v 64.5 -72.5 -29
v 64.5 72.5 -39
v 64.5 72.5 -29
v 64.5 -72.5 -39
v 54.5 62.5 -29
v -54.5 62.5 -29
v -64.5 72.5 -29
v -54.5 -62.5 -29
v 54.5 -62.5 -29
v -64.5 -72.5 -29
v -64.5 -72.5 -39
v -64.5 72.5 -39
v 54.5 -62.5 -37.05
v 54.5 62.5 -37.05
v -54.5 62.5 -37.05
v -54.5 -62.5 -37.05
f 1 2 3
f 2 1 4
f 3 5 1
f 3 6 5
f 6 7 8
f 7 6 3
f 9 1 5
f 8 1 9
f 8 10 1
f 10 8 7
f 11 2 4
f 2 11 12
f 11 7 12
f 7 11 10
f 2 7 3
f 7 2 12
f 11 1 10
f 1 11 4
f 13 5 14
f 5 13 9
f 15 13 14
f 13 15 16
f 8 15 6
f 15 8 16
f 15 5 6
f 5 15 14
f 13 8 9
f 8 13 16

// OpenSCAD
// file: Settings.scad
// Mesurements Of Platform Actual & Global Settings
// Mesurements ACTUAL
PlateWidth = 228;
PlateDepth = 145;
PlateHeight = 5;

ArmWidth = 20;
ArmHeight = 24;
ArmForwardProjection = 25;
ArmRearProjection = 50;
ArmVOffset = 15;

BaseWidth = 129;
BaseHeight = 5;
BaseForwardProjection = 10;
BaseRearProjection = 10;
BaseVOffset = 20;

BaseDeflectorLength = 20;
BaseDeflectorAngle = 45;

ScrewsWidthOutset = 35;
ScrewsDepthOutset = 35;
ScrewsHeadRadius = 10;
ScrewsHeadHeight = 2;
ScrewsHeadProtrusion = 5;
ScrewsShaftRadius = 2;
ScrewsHeadCutoutRadius = 2;

RearPlugWidth = 10;
RearPlugHeight = 5;
RearPlugVOffset = 1;

// Options
// ****************************************************************************************************

d = 0.05;   //Delta

ClipSticksize = 8;
PlateThickness = 5;

TensionerBearingRadius = 2;
TensionerOffsetRadius = 15;
TensionerAngle = 45;
TensionerBearingExtention = 3;
TensionerInset = 2;

//lips to keep the belt in
Lip = 3;
//TopLip = 500;
BottomLip = 5;

MidPlateOverlap = 20;
MidPlateOverlapHeight = 10;
MidPlateOverlapOffset = 7;
ClipHoleSize = 5;

LowerPlateCrossover =10;

RollerCore = 2;
RollerClearance = 2;
RollerLength = PlateDepth - 2*RollerClearance;

UpperRollerProjection  = 40;
UpperRollerRadius = 8;

LowerRollerProjection = 20;
LowerRollerRadius = 6;

RollerBearingCutoutRadius = 3;

IbeamProjection = 15;
IbeamPlateThikness = 6;


// Calculated
// ************************************************************************************************************
PlateX = BaseWidth/2;

RollerLength = PlateDepth - 2*RollerClearance;
PlateArmOverhang = PlateWidth/2 - BaseWidth/2  - ArmWidth; 

UpperRollerPlateX = ArmWidth+PlateArmOverhang+UpperRollerProjection-UpperRollerRadius;
UpperRollerPlateY = -UpperRollerRadius; 

LowerRollerPlateX = ArmWidth+PlateArmOverhang+LowerRollerProjection-LowerRollerRadius;
LowerRollerPlateY = -(ArmVOffset+ArmHeight)+LowerRollerRadius;
// main file
// Roller Project undercarrage

include <Settings.scad>;

Undercarriage();

module Undercarriage(){
	difference(){
	translate(v=[-BaseWidth/2,-PlateDepth/2,-ArmVOffset -ArmHeight ])
		cube(size=[BaseWidth,PlateDepth ,10]);


	translate(v=[-BaseWidth/2+10,-PlateDepth/2+10,-ArmVOffset -ArmHeight-d+2 ])
		cube(size=[BaseWidth-20,PlateDepth-20 ,10+2*d]);
	}
}
